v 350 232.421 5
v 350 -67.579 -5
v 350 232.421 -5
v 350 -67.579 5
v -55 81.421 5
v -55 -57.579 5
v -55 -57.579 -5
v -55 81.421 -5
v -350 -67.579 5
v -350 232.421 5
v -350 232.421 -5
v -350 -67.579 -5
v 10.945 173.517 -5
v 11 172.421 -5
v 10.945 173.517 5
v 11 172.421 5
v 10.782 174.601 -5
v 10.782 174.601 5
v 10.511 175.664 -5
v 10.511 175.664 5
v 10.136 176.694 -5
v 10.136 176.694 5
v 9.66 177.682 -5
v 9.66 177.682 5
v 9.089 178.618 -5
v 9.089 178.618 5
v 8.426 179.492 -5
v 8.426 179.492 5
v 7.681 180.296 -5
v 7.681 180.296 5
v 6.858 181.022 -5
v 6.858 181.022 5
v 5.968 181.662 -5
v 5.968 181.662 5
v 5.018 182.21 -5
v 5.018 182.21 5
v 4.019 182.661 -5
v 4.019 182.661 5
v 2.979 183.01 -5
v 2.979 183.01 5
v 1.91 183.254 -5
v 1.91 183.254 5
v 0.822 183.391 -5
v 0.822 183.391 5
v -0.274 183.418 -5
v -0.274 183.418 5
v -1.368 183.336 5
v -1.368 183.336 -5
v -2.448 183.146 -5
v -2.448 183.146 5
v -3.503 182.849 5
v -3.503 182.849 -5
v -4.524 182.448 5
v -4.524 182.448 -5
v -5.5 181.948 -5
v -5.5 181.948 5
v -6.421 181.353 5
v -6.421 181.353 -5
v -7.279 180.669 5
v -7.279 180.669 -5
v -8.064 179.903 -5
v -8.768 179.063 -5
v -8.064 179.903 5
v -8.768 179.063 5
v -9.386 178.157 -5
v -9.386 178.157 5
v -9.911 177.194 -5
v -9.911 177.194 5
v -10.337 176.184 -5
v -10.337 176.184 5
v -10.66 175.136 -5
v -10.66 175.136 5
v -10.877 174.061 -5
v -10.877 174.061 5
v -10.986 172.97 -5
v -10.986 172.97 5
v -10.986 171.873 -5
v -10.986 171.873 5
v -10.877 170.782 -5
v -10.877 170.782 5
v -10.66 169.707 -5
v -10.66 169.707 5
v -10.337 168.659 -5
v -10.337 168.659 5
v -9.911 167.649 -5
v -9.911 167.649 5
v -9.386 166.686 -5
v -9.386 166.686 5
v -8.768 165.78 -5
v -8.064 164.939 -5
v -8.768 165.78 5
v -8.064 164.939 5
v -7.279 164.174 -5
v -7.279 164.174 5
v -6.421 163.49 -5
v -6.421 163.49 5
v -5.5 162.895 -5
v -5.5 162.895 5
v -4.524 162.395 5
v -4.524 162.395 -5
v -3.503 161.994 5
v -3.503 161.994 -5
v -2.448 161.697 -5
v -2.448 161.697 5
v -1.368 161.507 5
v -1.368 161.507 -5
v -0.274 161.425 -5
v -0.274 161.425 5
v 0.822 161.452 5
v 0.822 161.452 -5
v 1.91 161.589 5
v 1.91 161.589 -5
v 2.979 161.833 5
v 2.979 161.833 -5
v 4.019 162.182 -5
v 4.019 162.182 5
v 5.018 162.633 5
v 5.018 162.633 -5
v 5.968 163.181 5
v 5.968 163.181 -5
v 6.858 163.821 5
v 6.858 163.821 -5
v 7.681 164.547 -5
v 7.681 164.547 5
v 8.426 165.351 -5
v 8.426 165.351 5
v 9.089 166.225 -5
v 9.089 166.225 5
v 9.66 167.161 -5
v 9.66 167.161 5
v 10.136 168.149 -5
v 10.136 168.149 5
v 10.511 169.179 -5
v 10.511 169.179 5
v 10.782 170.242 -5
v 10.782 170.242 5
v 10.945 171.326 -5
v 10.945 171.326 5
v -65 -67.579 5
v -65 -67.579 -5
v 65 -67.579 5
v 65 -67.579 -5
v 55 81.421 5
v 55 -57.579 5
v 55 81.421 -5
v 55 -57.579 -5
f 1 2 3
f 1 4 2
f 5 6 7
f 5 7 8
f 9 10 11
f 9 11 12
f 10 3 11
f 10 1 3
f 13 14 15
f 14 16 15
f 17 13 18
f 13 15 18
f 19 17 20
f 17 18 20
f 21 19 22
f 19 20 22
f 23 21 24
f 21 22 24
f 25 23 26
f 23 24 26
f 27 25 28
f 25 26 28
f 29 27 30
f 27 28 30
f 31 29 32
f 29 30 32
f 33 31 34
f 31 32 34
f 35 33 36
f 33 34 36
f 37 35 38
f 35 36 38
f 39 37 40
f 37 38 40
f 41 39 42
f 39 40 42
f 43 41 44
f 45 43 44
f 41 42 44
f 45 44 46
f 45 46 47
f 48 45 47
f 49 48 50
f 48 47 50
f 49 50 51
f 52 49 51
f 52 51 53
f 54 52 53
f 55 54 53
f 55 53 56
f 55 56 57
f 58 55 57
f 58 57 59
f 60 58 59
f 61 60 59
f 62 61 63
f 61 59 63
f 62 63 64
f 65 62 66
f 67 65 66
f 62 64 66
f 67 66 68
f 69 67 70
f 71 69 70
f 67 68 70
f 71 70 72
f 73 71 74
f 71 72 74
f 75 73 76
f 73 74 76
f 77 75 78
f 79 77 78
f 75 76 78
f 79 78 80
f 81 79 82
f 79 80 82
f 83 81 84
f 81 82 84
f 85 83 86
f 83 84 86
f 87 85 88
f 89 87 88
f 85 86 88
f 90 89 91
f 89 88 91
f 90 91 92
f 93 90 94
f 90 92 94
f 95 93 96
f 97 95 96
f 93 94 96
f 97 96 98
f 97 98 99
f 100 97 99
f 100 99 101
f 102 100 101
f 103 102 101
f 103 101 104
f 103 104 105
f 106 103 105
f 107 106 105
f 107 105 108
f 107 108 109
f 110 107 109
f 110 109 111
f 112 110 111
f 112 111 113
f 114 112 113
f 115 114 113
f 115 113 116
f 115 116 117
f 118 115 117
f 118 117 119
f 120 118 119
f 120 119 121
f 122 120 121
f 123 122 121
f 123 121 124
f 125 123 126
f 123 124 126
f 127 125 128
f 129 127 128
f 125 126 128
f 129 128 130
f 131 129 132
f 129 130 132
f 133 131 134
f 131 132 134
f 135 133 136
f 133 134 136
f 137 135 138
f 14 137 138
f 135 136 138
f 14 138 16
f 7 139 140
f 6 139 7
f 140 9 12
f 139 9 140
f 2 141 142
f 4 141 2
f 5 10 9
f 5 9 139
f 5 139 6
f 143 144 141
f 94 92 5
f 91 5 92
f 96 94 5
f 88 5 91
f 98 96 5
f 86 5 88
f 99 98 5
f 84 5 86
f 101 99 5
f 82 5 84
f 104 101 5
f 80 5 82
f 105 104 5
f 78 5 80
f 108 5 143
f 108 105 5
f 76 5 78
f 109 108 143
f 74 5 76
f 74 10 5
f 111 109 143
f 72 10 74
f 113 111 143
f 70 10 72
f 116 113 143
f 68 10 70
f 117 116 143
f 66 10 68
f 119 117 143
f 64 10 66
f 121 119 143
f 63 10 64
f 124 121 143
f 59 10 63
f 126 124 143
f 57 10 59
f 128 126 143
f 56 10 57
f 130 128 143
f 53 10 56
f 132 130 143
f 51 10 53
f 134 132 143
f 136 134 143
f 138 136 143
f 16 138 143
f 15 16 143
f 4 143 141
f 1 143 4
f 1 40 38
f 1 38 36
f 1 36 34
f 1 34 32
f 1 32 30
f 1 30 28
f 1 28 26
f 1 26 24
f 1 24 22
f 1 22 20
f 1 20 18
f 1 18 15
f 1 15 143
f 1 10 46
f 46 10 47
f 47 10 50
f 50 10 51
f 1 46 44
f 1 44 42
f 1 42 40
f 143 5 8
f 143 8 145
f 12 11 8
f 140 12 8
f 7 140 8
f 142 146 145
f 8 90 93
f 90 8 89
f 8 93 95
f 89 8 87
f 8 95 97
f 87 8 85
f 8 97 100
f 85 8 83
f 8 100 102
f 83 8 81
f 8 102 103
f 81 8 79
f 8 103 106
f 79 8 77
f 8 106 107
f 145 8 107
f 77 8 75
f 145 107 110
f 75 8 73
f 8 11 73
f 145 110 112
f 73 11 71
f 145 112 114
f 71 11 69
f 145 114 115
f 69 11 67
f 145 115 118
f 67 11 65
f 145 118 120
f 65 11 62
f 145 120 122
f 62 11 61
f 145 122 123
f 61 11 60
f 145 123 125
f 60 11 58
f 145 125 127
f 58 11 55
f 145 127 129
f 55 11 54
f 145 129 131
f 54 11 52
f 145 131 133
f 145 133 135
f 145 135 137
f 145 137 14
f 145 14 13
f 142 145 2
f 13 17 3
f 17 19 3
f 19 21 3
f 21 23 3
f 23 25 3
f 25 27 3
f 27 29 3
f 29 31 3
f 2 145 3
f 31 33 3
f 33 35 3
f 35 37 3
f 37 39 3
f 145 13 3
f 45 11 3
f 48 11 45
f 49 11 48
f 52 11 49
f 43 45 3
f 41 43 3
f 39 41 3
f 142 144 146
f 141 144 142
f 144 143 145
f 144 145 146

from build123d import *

# Parameters (mm, degrees)
BOSS_EXTRUDE1_DEPTH     = 5
SKETCH2_R               = 11
CUT_EXTRUDE1_DEPTH      = 6
CUT_EXTRUDE1_DEPTH_BACK = 6


with BuildPart() as part:
    # Sketch1 → Boss-Extrude1 (new body, symmetric)
    with BuildSketch(Plane.XY):
        Polygon((350, 232.421392473), (-350, 232.421392473), (-350, -67.578607527), (-65, -67.578607527), (-55, -57.578607527), (-55, 81.421392473), (55, 81.421392473), (55, -57.578607527), (65, -67.578607527), (350, -67.578607527), align=None)
    extrude(amount=BOSS_EXTRUDE1_DEPTH, both=True)

    # Sketch2 → Cut-Extrude1 (cut, two sides)
    with BuildSketch(Plane.XY) as cut_extrude1_sk:
        with Locations((0, 172.421392473)):
            Circle(SKETCH2_R)
    extrude(amount=CUT_EXTRUDE1_DEPTH, mode=Mode.SUBTRACT)
    extrude(cut_extrude1_sk.sketch, amount=-CUT_EXTRUDE1_DEPTH_BACK, mode=Mode.SUBTRACT)


solid = part.part
